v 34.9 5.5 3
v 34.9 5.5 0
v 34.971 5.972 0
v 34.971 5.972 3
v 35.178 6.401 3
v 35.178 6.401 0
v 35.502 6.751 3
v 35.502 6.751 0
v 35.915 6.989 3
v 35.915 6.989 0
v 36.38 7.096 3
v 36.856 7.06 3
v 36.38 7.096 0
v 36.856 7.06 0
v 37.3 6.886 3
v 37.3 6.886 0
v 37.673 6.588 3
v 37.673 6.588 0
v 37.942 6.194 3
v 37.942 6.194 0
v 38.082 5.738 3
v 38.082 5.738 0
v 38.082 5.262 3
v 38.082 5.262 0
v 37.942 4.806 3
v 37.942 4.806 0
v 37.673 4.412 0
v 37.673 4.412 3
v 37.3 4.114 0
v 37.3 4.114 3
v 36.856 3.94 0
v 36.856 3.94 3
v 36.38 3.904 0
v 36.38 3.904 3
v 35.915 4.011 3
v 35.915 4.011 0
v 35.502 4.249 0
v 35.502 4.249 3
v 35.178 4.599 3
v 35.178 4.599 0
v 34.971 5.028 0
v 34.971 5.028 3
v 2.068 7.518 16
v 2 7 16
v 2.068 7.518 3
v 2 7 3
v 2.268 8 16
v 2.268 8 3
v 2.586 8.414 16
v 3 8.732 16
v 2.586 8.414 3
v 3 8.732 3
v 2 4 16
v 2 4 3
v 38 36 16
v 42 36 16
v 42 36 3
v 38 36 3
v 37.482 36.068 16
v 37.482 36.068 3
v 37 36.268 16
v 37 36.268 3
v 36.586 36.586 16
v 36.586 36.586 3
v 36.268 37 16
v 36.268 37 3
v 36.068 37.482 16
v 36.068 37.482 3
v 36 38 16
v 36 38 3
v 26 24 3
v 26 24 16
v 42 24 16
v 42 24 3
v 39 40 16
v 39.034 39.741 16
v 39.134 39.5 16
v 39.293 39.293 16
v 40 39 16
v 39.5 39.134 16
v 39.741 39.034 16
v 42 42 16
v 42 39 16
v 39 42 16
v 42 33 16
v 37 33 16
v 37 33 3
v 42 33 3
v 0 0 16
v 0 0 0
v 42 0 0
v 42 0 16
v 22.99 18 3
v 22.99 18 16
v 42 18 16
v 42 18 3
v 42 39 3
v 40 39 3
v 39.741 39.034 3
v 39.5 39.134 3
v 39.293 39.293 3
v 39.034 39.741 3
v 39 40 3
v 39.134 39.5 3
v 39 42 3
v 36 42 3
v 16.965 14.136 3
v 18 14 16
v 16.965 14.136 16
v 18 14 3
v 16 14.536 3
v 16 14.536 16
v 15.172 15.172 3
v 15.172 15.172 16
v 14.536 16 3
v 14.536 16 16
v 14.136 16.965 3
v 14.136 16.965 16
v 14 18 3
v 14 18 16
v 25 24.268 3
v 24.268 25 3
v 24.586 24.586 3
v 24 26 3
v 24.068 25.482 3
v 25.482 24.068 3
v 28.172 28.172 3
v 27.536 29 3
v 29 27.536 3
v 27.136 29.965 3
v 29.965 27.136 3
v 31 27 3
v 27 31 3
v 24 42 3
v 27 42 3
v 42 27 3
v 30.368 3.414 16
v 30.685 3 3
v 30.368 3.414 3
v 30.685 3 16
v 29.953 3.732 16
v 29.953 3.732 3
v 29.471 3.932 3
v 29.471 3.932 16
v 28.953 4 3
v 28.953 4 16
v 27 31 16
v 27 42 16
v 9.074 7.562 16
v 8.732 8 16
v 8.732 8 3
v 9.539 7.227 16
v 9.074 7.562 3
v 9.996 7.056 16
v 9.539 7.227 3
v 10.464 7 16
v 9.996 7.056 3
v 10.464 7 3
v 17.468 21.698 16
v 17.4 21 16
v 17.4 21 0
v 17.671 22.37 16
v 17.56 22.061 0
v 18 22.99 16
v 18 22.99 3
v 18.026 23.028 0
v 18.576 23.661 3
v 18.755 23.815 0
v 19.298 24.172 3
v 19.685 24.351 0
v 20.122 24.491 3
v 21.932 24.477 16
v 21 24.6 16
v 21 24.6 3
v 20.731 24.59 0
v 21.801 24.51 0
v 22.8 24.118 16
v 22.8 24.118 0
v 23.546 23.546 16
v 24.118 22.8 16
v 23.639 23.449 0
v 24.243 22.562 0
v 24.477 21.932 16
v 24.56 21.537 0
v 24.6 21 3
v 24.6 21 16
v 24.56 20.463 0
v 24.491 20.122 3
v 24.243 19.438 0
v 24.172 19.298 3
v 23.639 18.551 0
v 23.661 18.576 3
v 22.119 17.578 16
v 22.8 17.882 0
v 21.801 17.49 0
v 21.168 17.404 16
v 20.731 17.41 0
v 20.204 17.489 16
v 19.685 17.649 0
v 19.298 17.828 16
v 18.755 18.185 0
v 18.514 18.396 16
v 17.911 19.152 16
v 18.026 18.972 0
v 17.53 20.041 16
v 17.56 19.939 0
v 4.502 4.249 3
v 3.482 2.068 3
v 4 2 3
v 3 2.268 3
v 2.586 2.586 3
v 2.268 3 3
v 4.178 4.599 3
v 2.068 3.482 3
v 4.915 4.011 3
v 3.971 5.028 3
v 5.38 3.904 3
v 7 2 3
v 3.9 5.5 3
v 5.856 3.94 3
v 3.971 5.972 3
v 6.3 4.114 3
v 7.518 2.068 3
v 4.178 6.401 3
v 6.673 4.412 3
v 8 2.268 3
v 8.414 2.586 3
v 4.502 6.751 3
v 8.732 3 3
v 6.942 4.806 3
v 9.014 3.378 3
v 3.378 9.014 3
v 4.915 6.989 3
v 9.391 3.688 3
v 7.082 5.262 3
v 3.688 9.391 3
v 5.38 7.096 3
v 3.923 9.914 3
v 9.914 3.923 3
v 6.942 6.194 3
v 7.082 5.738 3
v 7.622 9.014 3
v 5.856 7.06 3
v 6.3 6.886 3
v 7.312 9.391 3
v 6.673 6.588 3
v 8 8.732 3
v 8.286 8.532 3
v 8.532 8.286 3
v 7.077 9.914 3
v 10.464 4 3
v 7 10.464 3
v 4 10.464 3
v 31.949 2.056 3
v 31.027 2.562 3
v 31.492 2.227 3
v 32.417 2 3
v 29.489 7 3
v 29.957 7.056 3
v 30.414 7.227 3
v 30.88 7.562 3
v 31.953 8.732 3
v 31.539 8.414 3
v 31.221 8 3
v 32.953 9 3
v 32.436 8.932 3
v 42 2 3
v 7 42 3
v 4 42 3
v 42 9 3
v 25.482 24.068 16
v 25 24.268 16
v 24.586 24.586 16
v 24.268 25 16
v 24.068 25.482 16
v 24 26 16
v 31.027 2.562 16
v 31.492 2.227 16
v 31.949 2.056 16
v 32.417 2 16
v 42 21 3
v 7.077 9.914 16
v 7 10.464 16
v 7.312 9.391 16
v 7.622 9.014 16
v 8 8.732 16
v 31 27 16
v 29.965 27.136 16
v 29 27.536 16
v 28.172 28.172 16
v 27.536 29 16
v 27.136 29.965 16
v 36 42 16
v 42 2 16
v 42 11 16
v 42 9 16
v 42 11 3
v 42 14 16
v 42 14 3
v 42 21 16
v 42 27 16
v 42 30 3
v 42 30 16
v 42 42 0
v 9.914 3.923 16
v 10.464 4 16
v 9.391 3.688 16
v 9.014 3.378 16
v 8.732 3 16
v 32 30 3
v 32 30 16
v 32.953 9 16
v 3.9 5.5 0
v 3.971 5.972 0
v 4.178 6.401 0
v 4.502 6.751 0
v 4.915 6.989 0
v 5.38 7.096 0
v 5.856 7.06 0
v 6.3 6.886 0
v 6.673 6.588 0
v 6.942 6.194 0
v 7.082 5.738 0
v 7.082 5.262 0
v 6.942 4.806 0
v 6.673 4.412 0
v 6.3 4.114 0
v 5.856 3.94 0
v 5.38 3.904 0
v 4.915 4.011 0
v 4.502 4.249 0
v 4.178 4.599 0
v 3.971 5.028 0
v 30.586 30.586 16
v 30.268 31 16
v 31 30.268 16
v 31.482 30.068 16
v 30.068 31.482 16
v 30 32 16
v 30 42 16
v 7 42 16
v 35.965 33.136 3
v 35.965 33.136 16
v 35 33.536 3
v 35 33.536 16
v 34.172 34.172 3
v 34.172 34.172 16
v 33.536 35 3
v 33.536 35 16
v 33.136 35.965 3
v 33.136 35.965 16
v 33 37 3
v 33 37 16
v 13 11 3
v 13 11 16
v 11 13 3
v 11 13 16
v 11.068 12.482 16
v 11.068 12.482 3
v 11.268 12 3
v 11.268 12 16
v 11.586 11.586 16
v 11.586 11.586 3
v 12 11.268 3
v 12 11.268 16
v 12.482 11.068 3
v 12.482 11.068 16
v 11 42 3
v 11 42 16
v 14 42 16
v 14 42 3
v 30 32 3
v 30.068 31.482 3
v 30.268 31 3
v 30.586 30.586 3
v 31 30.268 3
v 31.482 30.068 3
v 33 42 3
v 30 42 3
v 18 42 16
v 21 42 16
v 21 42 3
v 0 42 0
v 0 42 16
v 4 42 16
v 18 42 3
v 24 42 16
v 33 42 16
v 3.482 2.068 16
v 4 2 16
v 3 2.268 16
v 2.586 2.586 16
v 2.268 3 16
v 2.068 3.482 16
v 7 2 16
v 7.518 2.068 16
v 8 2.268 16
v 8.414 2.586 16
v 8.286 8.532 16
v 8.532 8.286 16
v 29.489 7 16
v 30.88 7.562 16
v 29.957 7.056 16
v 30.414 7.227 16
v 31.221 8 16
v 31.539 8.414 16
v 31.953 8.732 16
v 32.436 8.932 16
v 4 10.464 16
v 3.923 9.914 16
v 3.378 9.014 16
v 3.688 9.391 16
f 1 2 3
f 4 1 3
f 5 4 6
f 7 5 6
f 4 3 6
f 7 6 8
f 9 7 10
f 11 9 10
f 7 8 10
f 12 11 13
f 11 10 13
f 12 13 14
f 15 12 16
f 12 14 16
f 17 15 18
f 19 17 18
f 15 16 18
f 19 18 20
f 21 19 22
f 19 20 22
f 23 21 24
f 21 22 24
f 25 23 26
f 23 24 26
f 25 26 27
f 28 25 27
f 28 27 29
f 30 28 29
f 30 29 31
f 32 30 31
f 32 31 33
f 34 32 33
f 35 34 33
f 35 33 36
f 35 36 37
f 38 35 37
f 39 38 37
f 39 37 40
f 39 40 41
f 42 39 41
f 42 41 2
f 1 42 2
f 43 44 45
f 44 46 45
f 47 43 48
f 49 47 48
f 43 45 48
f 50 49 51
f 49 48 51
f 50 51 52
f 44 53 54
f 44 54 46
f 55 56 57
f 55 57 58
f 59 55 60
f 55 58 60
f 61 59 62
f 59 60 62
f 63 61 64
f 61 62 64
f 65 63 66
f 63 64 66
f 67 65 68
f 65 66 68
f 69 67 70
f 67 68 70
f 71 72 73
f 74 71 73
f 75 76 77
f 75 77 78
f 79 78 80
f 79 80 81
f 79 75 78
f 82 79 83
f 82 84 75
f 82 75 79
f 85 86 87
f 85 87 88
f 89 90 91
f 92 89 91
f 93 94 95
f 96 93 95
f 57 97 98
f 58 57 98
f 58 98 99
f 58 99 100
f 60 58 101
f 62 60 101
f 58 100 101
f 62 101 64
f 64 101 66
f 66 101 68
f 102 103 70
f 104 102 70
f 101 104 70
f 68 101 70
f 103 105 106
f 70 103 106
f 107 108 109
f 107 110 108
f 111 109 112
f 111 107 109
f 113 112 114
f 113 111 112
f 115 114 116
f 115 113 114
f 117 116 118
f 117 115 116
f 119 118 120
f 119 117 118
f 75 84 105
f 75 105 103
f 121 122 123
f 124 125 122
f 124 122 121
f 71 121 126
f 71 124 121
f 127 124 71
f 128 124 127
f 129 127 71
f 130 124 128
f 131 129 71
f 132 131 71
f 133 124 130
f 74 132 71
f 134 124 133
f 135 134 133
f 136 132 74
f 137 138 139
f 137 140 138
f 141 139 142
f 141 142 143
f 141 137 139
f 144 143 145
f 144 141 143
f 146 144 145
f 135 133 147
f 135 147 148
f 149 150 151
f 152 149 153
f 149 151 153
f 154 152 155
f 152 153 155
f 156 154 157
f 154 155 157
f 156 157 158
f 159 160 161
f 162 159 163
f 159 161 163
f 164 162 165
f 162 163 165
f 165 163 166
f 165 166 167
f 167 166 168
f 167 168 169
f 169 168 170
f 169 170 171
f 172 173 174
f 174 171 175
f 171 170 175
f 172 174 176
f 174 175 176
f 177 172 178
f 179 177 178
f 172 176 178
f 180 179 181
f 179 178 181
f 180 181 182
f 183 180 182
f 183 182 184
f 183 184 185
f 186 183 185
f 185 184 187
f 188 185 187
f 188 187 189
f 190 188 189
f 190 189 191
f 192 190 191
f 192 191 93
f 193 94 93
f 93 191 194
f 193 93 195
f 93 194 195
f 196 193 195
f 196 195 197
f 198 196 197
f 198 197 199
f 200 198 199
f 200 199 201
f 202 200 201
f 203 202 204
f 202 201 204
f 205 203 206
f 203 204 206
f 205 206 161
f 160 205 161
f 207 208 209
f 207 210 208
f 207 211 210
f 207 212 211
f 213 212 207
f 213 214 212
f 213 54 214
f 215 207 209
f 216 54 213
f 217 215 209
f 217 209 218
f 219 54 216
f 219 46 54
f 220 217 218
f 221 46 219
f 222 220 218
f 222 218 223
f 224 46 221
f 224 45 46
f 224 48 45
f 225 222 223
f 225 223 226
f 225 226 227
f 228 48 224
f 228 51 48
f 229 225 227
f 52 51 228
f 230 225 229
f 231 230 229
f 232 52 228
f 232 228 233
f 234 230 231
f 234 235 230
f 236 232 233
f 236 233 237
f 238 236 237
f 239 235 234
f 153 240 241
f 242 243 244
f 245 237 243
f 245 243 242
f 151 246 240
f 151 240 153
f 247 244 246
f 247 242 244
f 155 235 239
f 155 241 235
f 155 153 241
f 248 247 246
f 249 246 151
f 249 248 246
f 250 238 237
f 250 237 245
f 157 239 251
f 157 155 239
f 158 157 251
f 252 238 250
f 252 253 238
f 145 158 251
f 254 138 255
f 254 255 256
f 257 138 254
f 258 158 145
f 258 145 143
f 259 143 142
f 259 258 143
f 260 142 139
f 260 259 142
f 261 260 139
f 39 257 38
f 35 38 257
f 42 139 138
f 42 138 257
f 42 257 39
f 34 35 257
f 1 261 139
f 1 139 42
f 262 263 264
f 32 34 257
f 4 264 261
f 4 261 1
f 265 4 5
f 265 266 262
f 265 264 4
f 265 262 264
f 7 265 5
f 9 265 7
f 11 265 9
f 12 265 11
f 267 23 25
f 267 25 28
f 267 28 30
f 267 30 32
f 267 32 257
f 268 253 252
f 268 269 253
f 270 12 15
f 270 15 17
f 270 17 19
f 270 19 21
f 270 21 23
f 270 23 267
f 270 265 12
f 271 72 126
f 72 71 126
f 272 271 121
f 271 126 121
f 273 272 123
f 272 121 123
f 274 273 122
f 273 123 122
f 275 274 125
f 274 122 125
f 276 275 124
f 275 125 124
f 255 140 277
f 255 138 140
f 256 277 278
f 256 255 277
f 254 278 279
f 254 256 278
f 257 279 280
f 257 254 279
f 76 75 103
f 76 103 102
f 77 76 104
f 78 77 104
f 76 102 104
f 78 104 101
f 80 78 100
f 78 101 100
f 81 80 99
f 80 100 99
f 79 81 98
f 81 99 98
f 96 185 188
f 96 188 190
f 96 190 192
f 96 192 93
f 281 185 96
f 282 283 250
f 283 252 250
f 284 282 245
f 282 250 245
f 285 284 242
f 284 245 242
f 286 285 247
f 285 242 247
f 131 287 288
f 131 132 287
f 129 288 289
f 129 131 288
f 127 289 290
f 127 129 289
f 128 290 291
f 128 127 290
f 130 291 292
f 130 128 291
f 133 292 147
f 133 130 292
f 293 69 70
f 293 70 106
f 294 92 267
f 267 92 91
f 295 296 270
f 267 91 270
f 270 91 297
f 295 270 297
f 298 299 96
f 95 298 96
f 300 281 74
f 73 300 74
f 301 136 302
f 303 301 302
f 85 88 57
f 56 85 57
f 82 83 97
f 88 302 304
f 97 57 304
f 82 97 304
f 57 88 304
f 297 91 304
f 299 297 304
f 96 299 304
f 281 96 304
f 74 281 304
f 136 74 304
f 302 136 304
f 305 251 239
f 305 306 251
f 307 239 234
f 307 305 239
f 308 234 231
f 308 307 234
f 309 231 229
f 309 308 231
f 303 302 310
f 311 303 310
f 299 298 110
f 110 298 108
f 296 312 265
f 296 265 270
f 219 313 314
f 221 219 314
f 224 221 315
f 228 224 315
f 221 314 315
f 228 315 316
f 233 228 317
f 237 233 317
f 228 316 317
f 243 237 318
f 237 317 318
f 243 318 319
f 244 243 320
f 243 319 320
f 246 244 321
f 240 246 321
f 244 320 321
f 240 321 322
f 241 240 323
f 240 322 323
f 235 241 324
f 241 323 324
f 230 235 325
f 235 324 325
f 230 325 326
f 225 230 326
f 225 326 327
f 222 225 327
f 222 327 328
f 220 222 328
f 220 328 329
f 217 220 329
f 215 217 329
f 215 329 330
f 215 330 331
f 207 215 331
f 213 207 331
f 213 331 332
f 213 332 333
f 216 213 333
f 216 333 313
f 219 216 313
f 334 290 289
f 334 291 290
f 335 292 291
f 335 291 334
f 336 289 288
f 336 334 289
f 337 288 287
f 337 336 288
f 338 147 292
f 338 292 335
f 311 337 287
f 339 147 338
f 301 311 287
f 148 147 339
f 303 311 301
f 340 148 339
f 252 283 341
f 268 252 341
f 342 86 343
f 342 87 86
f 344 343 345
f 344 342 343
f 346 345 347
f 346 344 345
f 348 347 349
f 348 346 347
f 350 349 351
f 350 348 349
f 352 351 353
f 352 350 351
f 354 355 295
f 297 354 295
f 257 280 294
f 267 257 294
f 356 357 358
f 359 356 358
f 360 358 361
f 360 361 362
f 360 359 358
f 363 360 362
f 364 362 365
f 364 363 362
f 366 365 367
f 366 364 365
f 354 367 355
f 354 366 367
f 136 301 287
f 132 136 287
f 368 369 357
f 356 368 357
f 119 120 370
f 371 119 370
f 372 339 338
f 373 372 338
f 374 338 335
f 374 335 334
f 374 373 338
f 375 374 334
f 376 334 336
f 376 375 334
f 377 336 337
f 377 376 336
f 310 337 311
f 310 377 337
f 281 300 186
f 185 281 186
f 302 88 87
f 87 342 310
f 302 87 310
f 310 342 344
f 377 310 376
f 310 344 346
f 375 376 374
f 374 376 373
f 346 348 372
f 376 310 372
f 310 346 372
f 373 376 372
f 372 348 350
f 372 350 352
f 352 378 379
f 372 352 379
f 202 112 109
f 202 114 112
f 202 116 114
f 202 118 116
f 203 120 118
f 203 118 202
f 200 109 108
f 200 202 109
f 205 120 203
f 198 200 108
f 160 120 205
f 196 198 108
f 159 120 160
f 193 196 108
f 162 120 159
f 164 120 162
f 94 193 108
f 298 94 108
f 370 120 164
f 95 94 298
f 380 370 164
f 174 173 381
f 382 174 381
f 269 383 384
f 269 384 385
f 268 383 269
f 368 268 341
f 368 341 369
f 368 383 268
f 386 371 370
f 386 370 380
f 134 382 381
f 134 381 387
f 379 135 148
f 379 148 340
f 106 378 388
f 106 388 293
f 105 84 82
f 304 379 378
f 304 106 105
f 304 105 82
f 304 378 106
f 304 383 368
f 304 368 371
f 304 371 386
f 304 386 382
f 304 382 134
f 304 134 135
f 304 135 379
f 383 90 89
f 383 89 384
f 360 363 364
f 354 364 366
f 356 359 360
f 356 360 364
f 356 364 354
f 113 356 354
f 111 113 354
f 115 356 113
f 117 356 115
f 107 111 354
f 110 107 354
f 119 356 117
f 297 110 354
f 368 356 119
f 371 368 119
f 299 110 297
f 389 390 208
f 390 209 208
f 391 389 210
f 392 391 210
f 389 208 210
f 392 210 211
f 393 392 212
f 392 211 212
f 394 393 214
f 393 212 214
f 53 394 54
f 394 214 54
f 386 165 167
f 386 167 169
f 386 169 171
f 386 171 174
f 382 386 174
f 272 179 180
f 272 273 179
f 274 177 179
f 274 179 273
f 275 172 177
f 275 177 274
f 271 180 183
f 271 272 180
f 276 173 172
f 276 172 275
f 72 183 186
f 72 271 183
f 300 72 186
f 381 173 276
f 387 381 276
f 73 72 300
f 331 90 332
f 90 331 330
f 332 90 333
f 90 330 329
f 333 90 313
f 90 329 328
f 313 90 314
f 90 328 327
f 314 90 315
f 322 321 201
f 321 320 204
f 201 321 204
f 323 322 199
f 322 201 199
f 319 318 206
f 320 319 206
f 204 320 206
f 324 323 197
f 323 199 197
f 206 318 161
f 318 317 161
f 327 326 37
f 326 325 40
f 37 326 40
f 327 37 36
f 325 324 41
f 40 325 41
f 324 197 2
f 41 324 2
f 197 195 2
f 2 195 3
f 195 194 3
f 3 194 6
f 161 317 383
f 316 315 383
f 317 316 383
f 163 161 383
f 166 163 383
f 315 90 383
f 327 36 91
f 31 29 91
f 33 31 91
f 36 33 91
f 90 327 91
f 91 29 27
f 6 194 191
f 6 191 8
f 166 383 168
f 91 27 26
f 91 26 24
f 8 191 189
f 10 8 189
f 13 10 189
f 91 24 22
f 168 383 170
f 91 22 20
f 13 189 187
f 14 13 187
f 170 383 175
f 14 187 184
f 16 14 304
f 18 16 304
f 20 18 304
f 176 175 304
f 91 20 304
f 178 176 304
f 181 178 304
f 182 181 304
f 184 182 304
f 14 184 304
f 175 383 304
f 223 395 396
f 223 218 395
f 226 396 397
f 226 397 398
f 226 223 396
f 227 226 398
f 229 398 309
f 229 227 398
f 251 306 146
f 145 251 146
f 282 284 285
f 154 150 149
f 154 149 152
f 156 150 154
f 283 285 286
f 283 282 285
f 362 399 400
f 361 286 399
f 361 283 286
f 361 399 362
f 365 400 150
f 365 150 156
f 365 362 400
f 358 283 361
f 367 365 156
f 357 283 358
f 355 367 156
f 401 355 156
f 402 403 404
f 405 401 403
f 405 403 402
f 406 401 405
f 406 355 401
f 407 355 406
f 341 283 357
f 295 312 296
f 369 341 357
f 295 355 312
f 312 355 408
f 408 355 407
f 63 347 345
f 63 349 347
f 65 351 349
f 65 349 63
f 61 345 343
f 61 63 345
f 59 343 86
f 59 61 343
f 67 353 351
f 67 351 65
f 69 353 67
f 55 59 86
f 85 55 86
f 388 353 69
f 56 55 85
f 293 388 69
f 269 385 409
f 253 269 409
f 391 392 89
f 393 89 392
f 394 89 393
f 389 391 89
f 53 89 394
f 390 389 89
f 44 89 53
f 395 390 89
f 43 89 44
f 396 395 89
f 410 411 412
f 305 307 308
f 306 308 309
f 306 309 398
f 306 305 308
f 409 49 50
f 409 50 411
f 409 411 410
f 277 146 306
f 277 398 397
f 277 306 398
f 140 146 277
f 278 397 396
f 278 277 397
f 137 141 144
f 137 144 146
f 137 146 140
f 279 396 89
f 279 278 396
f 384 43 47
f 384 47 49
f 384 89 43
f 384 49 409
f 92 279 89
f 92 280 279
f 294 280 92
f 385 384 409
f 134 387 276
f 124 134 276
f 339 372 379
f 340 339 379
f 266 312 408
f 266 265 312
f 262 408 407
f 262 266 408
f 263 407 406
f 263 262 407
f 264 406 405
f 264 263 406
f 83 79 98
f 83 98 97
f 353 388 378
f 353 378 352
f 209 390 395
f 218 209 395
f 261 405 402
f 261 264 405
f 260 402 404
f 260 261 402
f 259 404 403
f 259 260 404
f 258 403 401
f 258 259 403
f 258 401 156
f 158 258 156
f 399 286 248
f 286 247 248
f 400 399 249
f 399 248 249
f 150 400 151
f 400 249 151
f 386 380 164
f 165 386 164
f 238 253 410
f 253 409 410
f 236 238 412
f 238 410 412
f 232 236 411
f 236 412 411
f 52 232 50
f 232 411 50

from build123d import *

# Parameters (mm, degrees)
SKETCH1_W           = 42
SKETCH1_H           = 42
BOSS_EXTRUDE1_DEPTH = 16
CUT_EXTRUDE2_DEPTH  = 13
FILLET2_R           = 1
FILLET3_R           = 4
FILLET4_R           = 4
FILLET6_R           = 4
FILLET8_R           = 2
FILLET9_R           = 2
FILLET11_R          = 2
FILLET12_R          = 2
FILLET13_R          = 2
CUT_EXTRUDE3_REACH  = 63.514
SKETCH4_R           = 1.6
SKETCH4_R_2         = 3.6
SKETCH5_W           = 11.093459678
SKETCH5_H           = 7
SKETCH5_W_2         = 7
CUT_EXTRUDE14_DEPTH = 13
FILLET14_R          = 2
FILLET15_R          = 2
FILLET16_R          = 2
FILLET17_R          = 2
FILLET18_R          = 2
FILLET19_R          = 2
FILLET20_R          = 2
FILLET21_R          = 2
FILLET22_R          = 2
FILLET23_R          = 2
FILLET24_R          = 2
FILLET25_R          = 2
FILLET26_R          = 2


with BuildPart() as part:
    # Sketch1 → Boss-Extrude1 (new body)
    with BuildSketch(Plane.XY):
        with Locations((21, 21)):
            Rectangle(SKETCH1_W, SKETCH1_H)
    extrude(amount=BOSS_EXTRUDE1_DEPTH)

    # Sketch3 → Cut-Extrude2 (cut)
    with BuildSketch(Plane.XY.offset(16)):
        Polygon((39, 42), (39, 39), (42, 39), (42, 36), (36, 36), (36, 42), align=None)
        Polygon((33, 42), (33, 33), (42, 33), (42, 30), (30, 30), (30, 42), align=None)
        Polygon((42, 27), (27, 27), (27, 42), (24, 42), (24, 24), (42, 24), align=None)
        Polygon((42, 21), (21, 21), (21, 42), (18, 42), (18, 18), (42, 18), align=None)
        Polygon((42, 14), (14, 14), (14, 42), (11, 42), (11, 11), (42, 11), align=None)
        Polygon((42, 7), (7, 7), (7, 42), (4, 42), (4, 4), (42, 4), align=None)
    extrude(amount=-CUT_EXTRUDE2_DEPTH, mode=Mode.SUBTRACT)

    # Fillet2
    fillet2_edges = [part.edges().sort_by_distance(p)[0] for p in [
        (39, 39, 9.5),
    ]]
    fillet(fillet2_edges, radius=FILLET2_R)

    # Fillet3
    fillet3_edges = [part.edges().sort_by_distance(p)[0] for p in [
        (33, 33, 9.5),
    ]]
    fillet(fillet3_edges, radius=FILLET3_R)

    # Fillet4
    fillet4_edges = [part.edges().sort_by_distance(p)[0] for p in [
        (27, 27, 9.5),
    ]]
    fillet(fillet4_edges, radius=FILLET4_R)

    # Fillet6
    fillet6_edges = [part.edges().sort_by_distance(p)[0] for p in [
        (14, 14, 9.5),
    ]]
    fillet(fillet6_edges, radius=FILLET6_R)

    # Fillet8
    fillet8_edges = [part.edges().sort_by_distance(p)[0] for p in [
        (36, 36, 9.5),
    ]]
    fillet(fillet8_edges, radius=FILLET8_R)

    # Fillet9
    fillet9_edges = [part.edges().sort_by_distance(p)[0] for p in [
        (30, 30, 9.5),
    ]]
    fillet(fillet9_edges, radius=FILLET9_R)

    # Fillet11
    fillet11_edges = [part.edges().sort_by_distance(p)[0] for p in [
        (18, 18, 9.5),
    ]]
    fillet(fillet11_edges, radius=FILLET11_R)

    # Fillet12
    fillet12_edges = [part.edges().sort_by_distance(p)[0] for p in [
        (11, 11, 9.5),
    ]]
    fillet(fillet12_edges, radius=FILLET12_R)

    # Fillet13
    fillet13_edges = [part.edges().sort_by_distance(p)[0] for p in [
        (4, 4, 9.5),
    ]]
    fillet(fillet13_edges, radius=FILLET13_R)

    # Sketch4 → Cut-Extrude3 (cut, up to next)
    with BuildSketch(Plane(origin=(0, 0, 0), x_dir=(-1, 0, 0), z_dir=(0, 0, -1)), mode=Mode.PRIVATE) as cut_extrude3_sk1:
        with Locations((-36.5, 5.5)):
            Circle(SKETCH4_R)
    cut_extrude3_tool1 = extrude(cut_extrude3_sk1.sketch, amount=-CUT_EXTRUDE3_REACH, mode=Mode.PRIVATE) & part.part
    # Sketch4 → Cut-Extrude3 (cut, up to next)
    with BuildSketch(Plane(origin=(0, 0, 0), x_dir=(-1, 0, 0), z_dir=(0, 0, -1)), mode=Mode.PRIVATE) as cut_extrude3_sk2:
        with Locations((-5.5, 5.5)):
            Circle(SKETCH4_R)
    cut_extrude3_tool2 = extrude(cut_extrude3_sk2.sketch, amount=-CUT_EXTRUDE3_REACH, mode=Mode.PRIVATE) & part.part
    # Sketch4 → Cut-Extrude3 (cut, up to next)
    with BuildSketch(Plane(origin=(0, 0, 0), x_dir=(-1, 0, 0), z_dir=(0, 0, -1)), mode=Mode.PRIVATE) as cut_extrude3_sk3:
        with Locations((-21, 21)):
            Circle(SKETCH4_R_2)
    cut_extrude3_tool3 = extrude(cut_extrude3_sk3.sketch, amount=-CUT_EXTRUDE3_REACH, mode=Mode.PRIVATE) & part.part
    add(cut_extrude3_tool1.solids().sort_by_distance((36.5, 5.5, 0))[0], mode=Mode.SUBTRACT)
    add(cut_extrude3_tool2.solids().sort_by_distance((5.5, 5.5, 0))[0], mode=Mode.SUBTRACT)
    add(cut_extrude3_tool3.solids().sort_by_distance((21, 21, 0))[0], mode=Mode.SUBTRACT)

    # Sketch5 → Cut-Extrude14 (cut)
    with BuildSketch(Plane.XY.offset(16)):
        with Locations((36.5, 5.5)):
            Rectangle(SKETCH5_W, SKETCH5_H)
        with Locations((5.5, 5.5)):
            Rectangle(SKETCH5_W_2, SKETCH5_H)
    extrude(amount=-CUT_EXTRUDE14_DEPTH, mode=Mode.SUBTRACT)

    # Fillet14
    fillet14_edges = [part.edges().sort_by_distance(p)[0] for p in [
        (24, 24, 9.5),
    ]]
    fillet(fillet14_edges, radius=FILLET14_R)

    # Fillet15
    fillet15_edges = [part.edges().sort_by_distance(p)[0] for p in [
        (9, 2, 9.5),
    ]]
    fillet(fillet15_edges, radius=FILLET15_R - 0.0001)  # a hair under: the kernel refuses the full size

    # Fillet16
    fillet16_edges = [part.edges().sort_by_distance(p)[0] for p in [
        (2, 2, 9.5),
    ]]
    fillet(fillet16_edges, radius=FILLET16_R)

    # Fillet17
    fillet17_edges = [part.edges().sort_by_distance(p)[0] for p in [
        (2, 9, 9.5),
    ]]
    fillet(fillet17_edges, radius=FILLET17_R - 0.0001)  # a hair under: the kernel refuses the full size

    # Fillet18
    fillet18_edges = [part.edges().sort_by_distance(p)[0] for p in [
        (9, 9, 9.5),
    ]]
    fillet(fillet18_edges, radius=FILLET18_R - 0.0001)  # a hair under: the kernel refuses the full size

    # Fillet19
    fillet19_edges = [part.edges().sort_by_distance(p)[0] for p in [
        (4, 9, 9.5),
    ]]
    fillet(fillet19_edges, radius=FILLET19_R)

    # Fillet20
    fillet20_edges = [part.edges().sort_by_distance(p)[0] for p in [
        (7, 9, 9.5),
    ]]
    fillet(fillet20_edges, radius=FILLET20_R)

    # Fillet21
    fillet21_edges = [part.edges().sort_by_distance(p)[0] for p in [
        (9, 7, 9.5),
    ]]
    fillet(fillet21_edges, radius=FILLET21_R)

    # Fillet22
    fillet22_edges = [part.edges().sort_by_distance(p)[0] for p in [
        (9, 4, 9.5),
    ]]
    fillet(fillet22_edges, radius=FILLET22_R)

    # Fillet23
    fillet23_edges = [part.edges().sort_by_distance(p)[0] for p in [
        (30.953270161, 9, 9.5),
    ]]
    fillet(fillet23_edges, radius=FILLET23_R - 0.0001)  # a hair under: the kernel refuses the full size

    # Fillet24
    fillet24_edges = [part.edges().sort_by_distance(p)[0] for p in [
        (30.953270161, 7, 9.5),
    ]]
    fillet(fillet24_edges, radius=FILLET24_R)

    # Fillet25
    fillet25_edges = [part.edges().sort_by_distance(p)[0] for p in [
        (30.953270161, 4, 9.5),
    ]]
    fillet(fillet25_edges, radius=FILLET25_R - 0.0001)  # a hair under: the kernel refuses the full size

    # Fillet26
    fillet26_edges = [part.edges().sort_by_distance(p)[0] for p in [
        (30.953270161, 2, 9.5),
    ]]
    fillet(fillet26_edges, radius=FILLET26_R)


solid = part.part
